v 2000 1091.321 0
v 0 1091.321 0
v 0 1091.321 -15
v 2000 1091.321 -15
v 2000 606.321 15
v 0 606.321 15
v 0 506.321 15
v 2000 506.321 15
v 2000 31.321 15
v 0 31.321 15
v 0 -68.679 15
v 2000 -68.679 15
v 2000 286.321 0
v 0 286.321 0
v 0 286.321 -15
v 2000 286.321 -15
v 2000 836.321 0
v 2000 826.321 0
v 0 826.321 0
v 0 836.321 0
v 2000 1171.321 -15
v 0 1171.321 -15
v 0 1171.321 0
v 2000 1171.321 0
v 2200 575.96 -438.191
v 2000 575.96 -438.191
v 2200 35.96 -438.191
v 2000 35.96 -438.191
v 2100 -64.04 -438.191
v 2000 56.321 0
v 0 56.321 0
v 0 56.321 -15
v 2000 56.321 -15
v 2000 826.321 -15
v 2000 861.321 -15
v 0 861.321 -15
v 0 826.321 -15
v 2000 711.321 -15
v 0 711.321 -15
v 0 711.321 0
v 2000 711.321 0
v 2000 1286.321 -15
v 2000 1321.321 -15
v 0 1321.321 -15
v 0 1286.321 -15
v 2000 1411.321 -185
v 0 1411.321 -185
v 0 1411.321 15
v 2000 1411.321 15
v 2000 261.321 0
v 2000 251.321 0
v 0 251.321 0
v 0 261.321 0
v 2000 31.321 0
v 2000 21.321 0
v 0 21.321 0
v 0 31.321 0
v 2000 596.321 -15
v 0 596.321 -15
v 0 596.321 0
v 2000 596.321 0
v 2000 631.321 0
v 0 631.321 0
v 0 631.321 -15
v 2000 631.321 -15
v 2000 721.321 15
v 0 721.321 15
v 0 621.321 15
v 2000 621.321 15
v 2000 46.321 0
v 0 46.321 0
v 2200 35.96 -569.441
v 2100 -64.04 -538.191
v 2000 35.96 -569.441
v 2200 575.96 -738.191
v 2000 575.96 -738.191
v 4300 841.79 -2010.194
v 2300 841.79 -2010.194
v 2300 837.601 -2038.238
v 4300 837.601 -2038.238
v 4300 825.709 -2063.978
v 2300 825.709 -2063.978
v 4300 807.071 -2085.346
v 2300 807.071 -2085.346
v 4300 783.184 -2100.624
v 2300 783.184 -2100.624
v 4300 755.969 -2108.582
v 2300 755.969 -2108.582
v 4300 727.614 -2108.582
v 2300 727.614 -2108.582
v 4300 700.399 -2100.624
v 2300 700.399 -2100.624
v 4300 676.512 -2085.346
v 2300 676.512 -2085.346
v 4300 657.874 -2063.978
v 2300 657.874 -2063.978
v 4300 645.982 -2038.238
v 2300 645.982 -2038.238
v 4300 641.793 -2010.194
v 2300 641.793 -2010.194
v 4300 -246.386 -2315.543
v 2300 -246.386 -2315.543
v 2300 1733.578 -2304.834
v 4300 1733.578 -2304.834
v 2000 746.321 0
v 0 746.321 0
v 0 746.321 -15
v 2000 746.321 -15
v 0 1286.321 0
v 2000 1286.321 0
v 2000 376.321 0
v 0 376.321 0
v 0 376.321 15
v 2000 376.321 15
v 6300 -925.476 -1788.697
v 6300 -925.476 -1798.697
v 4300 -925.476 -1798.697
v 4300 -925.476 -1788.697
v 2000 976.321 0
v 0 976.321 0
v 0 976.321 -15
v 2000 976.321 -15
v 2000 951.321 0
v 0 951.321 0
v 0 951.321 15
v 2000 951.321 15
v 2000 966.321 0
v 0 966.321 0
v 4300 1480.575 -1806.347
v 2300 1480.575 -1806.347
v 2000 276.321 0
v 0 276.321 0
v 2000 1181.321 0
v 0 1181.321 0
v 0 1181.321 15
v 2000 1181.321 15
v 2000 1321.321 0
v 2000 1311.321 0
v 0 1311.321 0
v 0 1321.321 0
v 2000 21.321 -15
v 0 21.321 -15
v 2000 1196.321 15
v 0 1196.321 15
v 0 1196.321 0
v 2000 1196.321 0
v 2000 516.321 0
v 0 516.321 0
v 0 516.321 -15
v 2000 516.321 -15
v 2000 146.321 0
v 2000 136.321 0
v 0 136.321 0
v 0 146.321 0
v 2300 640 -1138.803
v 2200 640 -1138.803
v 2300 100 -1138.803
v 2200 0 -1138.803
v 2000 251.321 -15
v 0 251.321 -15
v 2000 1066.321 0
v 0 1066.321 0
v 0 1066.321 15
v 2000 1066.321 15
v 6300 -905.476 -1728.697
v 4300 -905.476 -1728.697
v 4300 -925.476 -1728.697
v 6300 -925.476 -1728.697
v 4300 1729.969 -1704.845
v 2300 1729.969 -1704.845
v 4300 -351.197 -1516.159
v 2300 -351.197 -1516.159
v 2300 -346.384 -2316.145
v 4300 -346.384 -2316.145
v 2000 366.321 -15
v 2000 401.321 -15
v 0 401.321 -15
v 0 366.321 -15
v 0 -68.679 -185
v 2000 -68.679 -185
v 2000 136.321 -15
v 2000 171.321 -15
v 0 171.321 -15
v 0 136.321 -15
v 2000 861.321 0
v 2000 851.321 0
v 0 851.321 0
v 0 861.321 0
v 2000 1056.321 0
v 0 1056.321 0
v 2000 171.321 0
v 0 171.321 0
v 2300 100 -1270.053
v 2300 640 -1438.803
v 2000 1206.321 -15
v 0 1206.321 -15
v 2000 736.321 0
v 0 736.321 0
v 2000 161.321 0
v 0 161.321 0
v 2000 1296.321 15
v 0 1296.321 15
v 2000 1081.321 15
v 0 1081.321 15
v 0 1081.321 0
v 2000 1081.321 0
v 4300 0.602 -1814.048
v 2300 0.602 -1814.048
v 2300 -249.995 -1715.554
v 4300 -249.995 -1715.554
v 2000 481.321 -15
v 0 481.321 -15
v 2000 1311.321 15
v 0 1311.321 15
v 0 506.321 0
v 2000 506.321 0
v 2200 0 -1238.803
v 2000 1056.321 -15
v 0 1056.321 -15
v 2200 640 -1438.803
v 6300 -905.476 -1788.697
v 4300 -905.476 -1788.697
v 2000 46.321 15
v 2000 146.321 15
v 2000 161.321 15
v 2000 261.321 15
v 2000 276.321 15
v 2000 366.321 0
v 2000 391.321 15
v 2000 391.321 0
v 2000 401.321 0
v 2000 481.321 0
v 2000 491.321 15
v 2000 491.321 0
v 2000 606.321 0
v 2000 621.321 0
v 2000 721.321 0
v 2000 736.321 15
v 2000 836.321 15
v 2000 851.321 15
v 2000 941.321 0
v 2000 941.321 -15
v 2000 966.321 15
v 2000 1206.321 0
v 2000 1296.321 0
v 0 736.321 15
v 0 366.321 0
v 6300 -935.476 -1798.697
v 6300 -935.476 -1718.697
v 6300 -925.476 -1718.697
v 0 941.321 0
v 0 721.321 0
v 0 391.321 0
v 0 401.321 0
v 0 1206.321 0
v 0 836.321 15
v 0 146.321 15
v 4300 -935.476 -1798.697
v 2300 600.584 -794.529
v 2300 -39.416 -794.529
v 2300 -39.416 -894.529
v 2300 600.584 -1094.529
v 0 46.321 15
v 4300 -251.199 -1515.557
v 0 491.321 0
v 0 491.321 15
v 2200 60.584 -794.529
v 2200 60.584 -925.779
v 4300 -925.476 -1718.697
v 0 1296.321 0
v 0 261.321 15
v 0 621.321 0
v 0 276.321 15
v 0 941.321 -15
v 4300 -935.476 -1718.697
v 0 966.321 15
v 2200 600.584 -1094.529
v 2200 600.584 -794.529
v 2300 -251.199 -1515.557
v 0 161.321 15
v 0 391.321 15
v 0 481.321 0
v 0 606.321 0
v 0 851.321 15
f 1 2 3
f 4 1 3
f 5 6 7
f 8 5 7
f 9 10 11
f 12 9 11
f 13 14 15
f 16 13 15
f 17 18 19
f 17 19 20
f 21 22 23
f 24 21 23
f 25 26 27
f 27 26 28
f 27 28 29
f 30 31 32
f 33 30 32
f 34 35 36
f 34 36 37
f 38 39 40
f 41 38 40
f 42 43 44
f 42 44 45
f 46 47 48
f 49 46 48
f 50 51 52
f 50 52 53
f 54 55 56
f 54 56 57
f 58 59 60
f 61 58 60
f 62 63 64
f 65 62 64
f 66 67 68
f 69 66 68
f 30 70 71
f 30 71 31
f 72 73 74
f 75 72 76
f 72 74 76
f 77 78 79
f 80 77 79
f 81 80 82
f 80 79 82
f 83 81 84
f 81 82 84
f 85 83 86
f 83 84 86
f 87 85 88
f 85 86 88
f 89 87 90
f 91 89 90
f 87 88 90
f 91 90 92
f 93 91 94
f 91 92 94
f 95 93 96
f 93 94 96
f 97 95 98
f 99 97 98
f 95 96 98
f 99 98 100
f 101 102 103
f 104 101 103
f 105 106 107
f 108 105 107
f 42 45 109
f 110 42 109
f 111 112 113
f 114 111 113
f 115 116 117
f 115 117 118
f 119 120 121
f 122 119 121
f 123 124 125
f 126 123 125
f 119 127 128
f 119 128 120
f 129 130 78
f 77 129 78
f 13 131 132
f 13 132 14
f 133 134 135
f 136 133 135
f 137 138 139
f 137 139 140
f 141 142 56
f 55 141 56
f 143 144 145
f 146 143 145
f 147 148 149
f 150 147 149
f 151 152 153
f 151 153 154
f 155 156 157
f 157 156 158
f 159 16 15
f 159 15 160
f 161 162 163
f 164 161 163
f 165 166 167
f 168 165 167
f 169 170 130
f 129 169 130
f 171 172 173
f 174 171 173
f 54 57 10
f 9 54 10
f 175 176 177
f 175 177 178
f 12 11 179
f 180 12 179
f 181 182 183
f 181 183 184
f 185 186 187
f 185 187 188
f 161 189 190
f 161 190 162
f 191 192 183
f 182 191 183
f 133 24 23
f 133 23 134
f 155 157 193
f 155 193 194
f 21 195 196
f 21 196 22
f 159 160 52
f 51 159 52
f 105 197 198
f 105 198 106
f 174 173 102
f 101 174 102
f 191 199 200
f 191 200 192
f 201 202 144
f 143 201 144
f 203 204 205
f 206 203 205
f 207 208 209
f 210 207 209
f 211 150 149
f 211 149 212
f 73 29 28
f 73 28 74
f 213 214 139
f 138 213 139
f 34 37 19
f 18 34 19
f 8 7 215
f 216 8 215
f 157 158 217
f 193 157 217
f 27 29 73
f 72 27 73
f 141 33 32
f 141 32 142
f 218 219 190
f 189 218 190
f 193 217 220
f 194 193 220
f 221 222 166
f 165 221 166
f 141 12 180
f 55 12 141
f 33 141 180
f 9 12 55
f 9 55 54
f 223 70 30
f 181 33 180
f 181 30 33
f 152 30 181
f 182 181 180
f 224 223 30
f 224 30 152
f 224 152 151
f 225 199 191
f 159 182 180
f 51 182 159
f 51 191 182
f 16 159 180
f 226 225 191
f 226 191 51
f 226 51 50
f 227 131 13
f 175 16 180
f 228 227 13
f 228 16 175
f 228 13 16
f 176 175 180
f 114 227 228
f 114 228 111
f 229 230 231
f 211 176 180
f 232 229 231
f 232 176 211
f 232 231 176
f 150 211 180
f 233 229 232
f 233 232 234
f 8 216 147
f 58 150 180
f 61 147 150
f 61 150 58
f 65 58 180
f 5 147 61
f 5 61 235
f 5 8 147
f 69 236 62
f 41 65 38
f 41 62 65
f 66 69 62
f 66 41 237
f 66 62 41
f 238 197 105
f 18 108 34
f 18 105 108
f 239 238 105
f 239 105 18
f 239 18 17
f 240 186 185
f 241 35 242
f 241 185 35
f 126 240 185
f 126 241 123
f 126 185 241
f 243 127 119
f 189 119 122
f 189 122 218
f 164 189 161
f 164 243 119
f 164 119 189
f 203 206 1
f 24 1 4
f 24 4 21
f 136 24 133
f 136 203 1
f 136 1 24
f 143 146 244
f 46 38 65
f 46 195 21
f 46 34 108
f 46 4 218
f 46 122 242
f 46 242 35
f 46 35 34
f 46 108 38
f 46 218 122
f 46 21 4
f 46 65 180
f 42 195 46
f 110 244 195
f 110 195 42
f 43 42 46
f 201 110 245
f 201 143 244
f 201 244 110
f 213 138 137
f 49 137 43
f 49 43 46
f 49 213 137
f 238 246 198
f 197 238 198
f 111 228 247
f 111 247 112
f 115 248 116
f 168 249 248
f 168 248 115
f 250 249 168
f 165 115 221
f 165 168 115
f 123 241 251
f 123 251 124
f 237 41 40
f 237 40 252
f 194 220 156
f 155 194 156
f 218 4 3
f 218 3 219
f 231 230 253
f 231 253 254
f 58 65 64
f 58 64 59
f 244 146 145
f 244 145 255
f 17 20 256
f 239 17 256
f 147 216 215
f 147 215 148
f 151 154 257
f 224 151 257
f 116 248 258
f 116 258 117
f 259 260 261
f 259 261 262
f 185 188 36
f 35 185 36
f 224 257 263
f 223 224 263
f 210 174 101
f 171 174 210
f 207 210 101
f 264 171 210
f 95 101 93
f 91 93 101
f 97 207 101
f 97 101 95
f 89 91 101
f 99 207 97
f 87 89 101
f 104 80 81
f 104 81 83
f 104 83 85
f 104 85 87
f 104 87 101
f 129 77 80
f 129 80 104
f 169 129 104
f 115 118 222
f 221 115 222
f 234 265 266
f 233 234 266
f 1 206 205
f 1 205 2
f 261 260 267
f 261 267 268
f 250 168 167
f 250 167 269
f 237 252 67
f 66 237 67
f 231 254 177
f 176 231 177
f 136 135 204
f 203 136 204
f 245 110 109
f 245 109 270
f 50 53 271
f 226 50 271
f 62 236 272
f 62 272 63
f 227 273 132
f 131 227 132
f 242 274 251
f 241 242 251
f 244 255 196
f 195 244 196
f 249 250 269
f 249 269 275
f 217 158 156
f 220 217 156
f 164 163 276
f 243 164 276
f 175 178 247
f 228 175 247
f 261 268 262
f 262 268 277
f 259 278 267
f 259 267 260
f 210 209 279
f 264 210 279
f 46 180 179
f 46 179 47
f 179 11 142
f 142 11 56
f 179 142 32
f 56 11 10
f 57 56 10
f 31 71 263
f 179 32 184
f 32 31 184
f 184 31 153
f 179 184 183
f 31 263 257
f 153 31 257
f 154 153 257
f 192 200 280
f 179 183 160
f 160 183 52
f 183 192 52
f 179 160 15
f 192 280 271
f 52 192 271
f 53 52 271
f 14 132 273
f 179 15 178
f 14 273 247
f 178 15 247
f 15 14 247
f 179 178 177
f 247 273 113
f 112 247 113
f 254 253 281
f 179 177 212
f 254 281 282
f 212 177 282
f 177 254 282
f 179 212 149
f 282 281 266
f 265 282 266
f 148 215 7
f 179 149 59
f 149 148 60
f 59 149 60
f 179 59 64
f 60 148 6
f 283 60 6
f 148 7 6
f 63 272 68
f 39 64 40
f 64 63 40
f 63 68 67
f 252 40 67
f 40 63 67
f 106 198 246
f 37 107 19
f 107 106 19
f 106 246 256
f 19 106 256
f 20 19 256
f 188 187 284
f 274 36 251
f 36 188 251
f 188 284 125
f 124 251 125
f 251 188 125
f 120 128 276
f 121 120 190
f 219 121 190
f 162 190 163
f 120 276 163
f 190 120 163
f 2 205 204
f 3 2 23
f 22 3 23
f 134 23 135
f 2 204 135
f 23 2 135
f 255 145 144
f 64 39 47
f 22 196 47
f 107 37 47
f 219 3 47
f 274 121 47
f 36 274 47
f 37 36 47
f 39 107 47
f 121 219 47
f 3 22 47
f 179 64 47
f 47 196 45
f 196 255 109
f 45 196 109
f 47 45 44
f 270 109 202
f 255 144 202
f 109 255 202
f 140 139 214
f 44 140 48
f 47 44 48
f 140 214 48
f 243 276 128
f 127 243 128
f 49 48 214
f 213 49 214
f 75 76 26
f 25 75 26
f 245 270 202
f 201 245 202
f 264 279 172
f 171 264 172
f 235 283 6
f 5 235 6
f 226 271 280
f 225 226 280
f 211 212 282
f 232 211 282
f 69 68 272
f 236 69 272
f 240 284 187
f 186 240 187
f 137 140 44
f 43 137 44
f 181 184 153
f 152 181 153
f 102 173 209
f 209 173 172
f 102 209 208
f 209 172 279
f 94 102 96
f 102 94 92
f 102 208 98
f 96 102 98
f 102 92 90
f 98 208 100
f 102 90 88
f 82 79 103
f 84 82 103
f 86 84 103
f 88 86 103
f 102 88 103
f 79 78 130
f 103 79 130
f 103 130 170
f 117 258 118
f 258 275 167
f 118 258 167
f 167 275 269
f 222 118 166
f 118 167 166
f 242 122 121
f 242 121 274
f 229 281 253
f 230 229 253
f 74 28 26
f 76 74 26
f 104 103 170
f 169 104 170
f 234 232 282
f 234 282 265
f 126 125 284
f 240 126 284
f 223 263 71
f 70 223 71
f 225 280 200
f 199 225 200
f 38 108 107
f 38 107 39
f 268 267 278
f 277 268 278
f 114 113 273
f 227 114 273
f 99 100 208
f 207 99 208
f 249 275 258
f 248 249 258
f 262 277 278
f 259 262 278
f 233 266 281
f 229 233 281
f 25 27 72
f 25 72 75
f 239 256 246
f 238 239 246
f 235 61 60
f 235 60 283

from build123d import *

# Parameters (mm, degrees)
F1_DEPTH  = 2000
F3_DEPTH  = 200
F4_SIZE   = 100
F5_SIZE   = 99.99999
F8_DEPTH  = 100
F9_DEPTH  = 100
F10_SIZE  = 99.99999
F11_SIZE  = 99.99999
F13_DEPTH = 2000
F15_DEPTH = 2000


# Not quite as in the source:
# - a fillet or chamfer is up to 0.001 mm smaller than in the source, because OpenCascade refuses the exact size


with BuildPart() as f1:
    # F0 (on Right) → F1 (new body)
    with BuildSketch(Plane.YZ):
        Polygon((31.3205629587, 15), (-68.6794370413, 15), (-68.6794370413, -185), (1411.3205629587, -185), (1411.3205629587, 15), (1311.3205629587, 15), (1311.3205629587, 0), (1321.3205629587, 0), (1321.3205629587, -15), (1286.3205629587, -15), (1286.3205629587, 0), (1296.3205629587, 0), (1296.3205629587, 15), (1196.3205629587, 15), (1196.3205629587, 0), (1206.3205629587, 0), (1206.3205629587, -15), (1171.3205629587, -15), (1171.3205629587, 0), (1181.3205629587, 0), (1181.3205629587, 15), (1081.3205629587, 15), (1081.3205629587, 0), (1091.3205629587, 0), (1091.3205629587, -15), (1056.3205629587, -15), (1056.3205629587, 0), (1066.3205629587, 0), (1066.3205629587, 15), (966.3205629587, 15), (966.3205629587, 0), (976.3205629587, 0), (976.3205629587, -15), (941.3205629587, -15), (941.3205629587, 0), (951.3205629587, 0), (951.3205629587, 15), (851.3205629587, 15), (851.3205629587, 0), (861.3205629587, 0), (861.3205629587, -15), (826.3205629587, -15), (826.3205629587, 0), (836.3205629587, 0), (836.3205629587, 15), (736.3205629587, 15), (736.3205629587, 0), (746.3205629587, 0), (746.3205629587, -15), (711.3205629587, -15), (711.3205629587, 0), (721.3205629587, 0), (721.3205629587, 15), (621.3205629587, 15), (621.3205629587, 0), (631.3205629587, 0), (631.3205629587, -15), (596.3205629587, -15), (596.3205629587, 0), (606.3205629587, 0), (606.3205629587, 15), (506.3205629587, 15), (506.3205629587, 0), (516.3205629587, 0), (516.3205629587, -15), (481.3205629587, -15), (481.3205629587, 0), (491.3205629587, 0), (491.3205629587, 15), (391.3205629587, 15), (391.3205629587, 0), (401.3205629587, 0), (401.3205629587, -15), (366.3205629587, -15), (366.3205629587, 0), (376.3205629587, 0), (376.3205629587, 15), (276.3205629587, 15), (276.3205629587, 0), (286.3205629587, 0), (286.3205629587, -15), (251.3205629587, -15), (251.3205629587, 0), (261.3205629587, 0), (261.3205629587, 15), (161.3205629587, 15), (161.3205629587, 0), (171.3205629587, 0), (171.3205629587, -15), (136.3205629587, -15), (136.3205629587, 0), (146.3205629587, 0), (146.3205629587, 15), (46.3205629587, 15), (46.3205629587, 0), (56.3205629587, 0), (56.3205629587, -15), (21.3205629587, -15), (21.3205629587, 0), (31.3205629587, 0), align=None)
    extrude(amount=F1_DEPTH)


with BuildPart() as f3:
    # F2 (on face) → F3 (new body)
    with BuildSketch(Plane.YZ.offset(2000)):
        Polygon((575.9602183104, -438.1909608841), (-64.0397816896, -438.1909608841), (-64.0397816896, -538.1909608841), (575.9602183104, -738.1909608841), align=None)
    extrude(amount=F3_DEPTH)

    # F4
    f4_edges = [f3.edges().sort_by_distance(p)[0] for p in [
        (2200, -64.039782, -488.190961),
    ]]
    chamfer(f4_edges, length=F4_SIZE)

    # F5 (size 100 in the source; OpenCascade refuses exactly that, so slightly less here)
    f5_edges = [f3.edges().sort_by_distance(p)[0] for p in [
        (2000, -64.039782, -488.190961),
    ]]
    chamfer(f5_edges, length=F5_SIZE)


with BuildPart() as f8:
    # F6 (on face) → F8 (new body)
    with BuildSketch(Plane.YZ.offset(2200)):
        Polygon((600.5844579637, -1094.5291638374), (600.5844579637, -794.5291638374), (-39.4155420363, -794.5291638374), (-39.4155420363, -894.5291638374), align=None)
    extrude(amount=F8_DEPTH)

    # F10 (size 100 in the source; OpenCascade refuses exactly that, so slightly less here)
    f10_edges = [f8.edges().sort_by_distance(p)[0] for p in [
        (2200, -39.415542, -844.529164),
    ]]
    chamfer(f10_edges, length=F10_SIZE)


with BuildPart() as f9:
    # F7 (on face) → F9 (new body)
    with BuildSketch(Plane.YZ.offset(2200)):
        Polygon((640, -1438.8029098511), (640, -1138.8029098511), (0, -1138.8029098511), (0, -1238.8029098511), align=None)
    extrude(amount=F9_DEPTH)

    # F11 (size 100 in the source; OpenCascade refuses exactly that, so slightly less here)
    f11_edges = [f9.edges().sort_by_distance(p)[0] for p in [
        (2300, 0, -1188.80291),
    ]]
    chamfer(f11_edges, length=F11_SIZE)


with BuildPart() as f13:
    # F12 (on face) → F13 (new body)
    with BuildSketch(Plane.YZ.offset(2300)):
        with BuildLine():
            ThreePointArc((841.7896378459, -2010.1940166026), (741.7914475541, -2109.592403471), (641.7932572623, -2010.1940166026))
            Line((641.7932572623, -2010.1940166026), (0.6016131315, -1814.0479600607))
            Line((0.6016131315, -1814.0479600607), (-249.9954757296, -1715.5538025978))
            Line((-249.9954757296, -1715.5538025978), (-251.1987019926, -1515.5574220141))
            Line((-251.1987019926, -1515.5574220141), (-351.1968922845, -1516.1590351456))
            Line((-351.1968922845, -1516.1590351456), (-346.3839872322, -2316.1445574802))
            Line((-346.3839872322, -2316.1445574802), (-246.3857969404, -2315.5429443487))
            Line((-246.3857969404, -2315.5429443487), (1733.5783708378, -2304.8342306074))
            Line((1733.5783708378, -2304.8342306074), (1729.9686920486, -1704.8450888564))
            Line((1729.9686920486, -1704.8450888564), (1480.5748294505, -1806.3473119771))
            Line((1480.5748294505, -1806.3473119771), (841.7896378459, -2010.1940166026))
        make_face()
    extrude(amount=F13_DEPTH)


with BuildPart() as f15:
    # F14 (on face) → F15 (new body)
    with BuildSketch(Plane.YZ.offset(4300)):
        Polygon((-925.4759454727, -1718.6972332001), (-935.4759454727, -1718.6972332001), (-935.4759454727, -1798.6972332001), (-925.4759454727, -1798.6972332001), (-925.4759454727, -1788.6972332001), (-905.4759454727, -1788.6972332001), (-905.4759454727, -1728.6972332001), (-925.4759454727, -1728.6972332001), align=None)
    extrude(amount=F15_DEPTH)


solid = Compound([f1.part, f3.part, f8.part, f9.part, f13.part, f15.part])
